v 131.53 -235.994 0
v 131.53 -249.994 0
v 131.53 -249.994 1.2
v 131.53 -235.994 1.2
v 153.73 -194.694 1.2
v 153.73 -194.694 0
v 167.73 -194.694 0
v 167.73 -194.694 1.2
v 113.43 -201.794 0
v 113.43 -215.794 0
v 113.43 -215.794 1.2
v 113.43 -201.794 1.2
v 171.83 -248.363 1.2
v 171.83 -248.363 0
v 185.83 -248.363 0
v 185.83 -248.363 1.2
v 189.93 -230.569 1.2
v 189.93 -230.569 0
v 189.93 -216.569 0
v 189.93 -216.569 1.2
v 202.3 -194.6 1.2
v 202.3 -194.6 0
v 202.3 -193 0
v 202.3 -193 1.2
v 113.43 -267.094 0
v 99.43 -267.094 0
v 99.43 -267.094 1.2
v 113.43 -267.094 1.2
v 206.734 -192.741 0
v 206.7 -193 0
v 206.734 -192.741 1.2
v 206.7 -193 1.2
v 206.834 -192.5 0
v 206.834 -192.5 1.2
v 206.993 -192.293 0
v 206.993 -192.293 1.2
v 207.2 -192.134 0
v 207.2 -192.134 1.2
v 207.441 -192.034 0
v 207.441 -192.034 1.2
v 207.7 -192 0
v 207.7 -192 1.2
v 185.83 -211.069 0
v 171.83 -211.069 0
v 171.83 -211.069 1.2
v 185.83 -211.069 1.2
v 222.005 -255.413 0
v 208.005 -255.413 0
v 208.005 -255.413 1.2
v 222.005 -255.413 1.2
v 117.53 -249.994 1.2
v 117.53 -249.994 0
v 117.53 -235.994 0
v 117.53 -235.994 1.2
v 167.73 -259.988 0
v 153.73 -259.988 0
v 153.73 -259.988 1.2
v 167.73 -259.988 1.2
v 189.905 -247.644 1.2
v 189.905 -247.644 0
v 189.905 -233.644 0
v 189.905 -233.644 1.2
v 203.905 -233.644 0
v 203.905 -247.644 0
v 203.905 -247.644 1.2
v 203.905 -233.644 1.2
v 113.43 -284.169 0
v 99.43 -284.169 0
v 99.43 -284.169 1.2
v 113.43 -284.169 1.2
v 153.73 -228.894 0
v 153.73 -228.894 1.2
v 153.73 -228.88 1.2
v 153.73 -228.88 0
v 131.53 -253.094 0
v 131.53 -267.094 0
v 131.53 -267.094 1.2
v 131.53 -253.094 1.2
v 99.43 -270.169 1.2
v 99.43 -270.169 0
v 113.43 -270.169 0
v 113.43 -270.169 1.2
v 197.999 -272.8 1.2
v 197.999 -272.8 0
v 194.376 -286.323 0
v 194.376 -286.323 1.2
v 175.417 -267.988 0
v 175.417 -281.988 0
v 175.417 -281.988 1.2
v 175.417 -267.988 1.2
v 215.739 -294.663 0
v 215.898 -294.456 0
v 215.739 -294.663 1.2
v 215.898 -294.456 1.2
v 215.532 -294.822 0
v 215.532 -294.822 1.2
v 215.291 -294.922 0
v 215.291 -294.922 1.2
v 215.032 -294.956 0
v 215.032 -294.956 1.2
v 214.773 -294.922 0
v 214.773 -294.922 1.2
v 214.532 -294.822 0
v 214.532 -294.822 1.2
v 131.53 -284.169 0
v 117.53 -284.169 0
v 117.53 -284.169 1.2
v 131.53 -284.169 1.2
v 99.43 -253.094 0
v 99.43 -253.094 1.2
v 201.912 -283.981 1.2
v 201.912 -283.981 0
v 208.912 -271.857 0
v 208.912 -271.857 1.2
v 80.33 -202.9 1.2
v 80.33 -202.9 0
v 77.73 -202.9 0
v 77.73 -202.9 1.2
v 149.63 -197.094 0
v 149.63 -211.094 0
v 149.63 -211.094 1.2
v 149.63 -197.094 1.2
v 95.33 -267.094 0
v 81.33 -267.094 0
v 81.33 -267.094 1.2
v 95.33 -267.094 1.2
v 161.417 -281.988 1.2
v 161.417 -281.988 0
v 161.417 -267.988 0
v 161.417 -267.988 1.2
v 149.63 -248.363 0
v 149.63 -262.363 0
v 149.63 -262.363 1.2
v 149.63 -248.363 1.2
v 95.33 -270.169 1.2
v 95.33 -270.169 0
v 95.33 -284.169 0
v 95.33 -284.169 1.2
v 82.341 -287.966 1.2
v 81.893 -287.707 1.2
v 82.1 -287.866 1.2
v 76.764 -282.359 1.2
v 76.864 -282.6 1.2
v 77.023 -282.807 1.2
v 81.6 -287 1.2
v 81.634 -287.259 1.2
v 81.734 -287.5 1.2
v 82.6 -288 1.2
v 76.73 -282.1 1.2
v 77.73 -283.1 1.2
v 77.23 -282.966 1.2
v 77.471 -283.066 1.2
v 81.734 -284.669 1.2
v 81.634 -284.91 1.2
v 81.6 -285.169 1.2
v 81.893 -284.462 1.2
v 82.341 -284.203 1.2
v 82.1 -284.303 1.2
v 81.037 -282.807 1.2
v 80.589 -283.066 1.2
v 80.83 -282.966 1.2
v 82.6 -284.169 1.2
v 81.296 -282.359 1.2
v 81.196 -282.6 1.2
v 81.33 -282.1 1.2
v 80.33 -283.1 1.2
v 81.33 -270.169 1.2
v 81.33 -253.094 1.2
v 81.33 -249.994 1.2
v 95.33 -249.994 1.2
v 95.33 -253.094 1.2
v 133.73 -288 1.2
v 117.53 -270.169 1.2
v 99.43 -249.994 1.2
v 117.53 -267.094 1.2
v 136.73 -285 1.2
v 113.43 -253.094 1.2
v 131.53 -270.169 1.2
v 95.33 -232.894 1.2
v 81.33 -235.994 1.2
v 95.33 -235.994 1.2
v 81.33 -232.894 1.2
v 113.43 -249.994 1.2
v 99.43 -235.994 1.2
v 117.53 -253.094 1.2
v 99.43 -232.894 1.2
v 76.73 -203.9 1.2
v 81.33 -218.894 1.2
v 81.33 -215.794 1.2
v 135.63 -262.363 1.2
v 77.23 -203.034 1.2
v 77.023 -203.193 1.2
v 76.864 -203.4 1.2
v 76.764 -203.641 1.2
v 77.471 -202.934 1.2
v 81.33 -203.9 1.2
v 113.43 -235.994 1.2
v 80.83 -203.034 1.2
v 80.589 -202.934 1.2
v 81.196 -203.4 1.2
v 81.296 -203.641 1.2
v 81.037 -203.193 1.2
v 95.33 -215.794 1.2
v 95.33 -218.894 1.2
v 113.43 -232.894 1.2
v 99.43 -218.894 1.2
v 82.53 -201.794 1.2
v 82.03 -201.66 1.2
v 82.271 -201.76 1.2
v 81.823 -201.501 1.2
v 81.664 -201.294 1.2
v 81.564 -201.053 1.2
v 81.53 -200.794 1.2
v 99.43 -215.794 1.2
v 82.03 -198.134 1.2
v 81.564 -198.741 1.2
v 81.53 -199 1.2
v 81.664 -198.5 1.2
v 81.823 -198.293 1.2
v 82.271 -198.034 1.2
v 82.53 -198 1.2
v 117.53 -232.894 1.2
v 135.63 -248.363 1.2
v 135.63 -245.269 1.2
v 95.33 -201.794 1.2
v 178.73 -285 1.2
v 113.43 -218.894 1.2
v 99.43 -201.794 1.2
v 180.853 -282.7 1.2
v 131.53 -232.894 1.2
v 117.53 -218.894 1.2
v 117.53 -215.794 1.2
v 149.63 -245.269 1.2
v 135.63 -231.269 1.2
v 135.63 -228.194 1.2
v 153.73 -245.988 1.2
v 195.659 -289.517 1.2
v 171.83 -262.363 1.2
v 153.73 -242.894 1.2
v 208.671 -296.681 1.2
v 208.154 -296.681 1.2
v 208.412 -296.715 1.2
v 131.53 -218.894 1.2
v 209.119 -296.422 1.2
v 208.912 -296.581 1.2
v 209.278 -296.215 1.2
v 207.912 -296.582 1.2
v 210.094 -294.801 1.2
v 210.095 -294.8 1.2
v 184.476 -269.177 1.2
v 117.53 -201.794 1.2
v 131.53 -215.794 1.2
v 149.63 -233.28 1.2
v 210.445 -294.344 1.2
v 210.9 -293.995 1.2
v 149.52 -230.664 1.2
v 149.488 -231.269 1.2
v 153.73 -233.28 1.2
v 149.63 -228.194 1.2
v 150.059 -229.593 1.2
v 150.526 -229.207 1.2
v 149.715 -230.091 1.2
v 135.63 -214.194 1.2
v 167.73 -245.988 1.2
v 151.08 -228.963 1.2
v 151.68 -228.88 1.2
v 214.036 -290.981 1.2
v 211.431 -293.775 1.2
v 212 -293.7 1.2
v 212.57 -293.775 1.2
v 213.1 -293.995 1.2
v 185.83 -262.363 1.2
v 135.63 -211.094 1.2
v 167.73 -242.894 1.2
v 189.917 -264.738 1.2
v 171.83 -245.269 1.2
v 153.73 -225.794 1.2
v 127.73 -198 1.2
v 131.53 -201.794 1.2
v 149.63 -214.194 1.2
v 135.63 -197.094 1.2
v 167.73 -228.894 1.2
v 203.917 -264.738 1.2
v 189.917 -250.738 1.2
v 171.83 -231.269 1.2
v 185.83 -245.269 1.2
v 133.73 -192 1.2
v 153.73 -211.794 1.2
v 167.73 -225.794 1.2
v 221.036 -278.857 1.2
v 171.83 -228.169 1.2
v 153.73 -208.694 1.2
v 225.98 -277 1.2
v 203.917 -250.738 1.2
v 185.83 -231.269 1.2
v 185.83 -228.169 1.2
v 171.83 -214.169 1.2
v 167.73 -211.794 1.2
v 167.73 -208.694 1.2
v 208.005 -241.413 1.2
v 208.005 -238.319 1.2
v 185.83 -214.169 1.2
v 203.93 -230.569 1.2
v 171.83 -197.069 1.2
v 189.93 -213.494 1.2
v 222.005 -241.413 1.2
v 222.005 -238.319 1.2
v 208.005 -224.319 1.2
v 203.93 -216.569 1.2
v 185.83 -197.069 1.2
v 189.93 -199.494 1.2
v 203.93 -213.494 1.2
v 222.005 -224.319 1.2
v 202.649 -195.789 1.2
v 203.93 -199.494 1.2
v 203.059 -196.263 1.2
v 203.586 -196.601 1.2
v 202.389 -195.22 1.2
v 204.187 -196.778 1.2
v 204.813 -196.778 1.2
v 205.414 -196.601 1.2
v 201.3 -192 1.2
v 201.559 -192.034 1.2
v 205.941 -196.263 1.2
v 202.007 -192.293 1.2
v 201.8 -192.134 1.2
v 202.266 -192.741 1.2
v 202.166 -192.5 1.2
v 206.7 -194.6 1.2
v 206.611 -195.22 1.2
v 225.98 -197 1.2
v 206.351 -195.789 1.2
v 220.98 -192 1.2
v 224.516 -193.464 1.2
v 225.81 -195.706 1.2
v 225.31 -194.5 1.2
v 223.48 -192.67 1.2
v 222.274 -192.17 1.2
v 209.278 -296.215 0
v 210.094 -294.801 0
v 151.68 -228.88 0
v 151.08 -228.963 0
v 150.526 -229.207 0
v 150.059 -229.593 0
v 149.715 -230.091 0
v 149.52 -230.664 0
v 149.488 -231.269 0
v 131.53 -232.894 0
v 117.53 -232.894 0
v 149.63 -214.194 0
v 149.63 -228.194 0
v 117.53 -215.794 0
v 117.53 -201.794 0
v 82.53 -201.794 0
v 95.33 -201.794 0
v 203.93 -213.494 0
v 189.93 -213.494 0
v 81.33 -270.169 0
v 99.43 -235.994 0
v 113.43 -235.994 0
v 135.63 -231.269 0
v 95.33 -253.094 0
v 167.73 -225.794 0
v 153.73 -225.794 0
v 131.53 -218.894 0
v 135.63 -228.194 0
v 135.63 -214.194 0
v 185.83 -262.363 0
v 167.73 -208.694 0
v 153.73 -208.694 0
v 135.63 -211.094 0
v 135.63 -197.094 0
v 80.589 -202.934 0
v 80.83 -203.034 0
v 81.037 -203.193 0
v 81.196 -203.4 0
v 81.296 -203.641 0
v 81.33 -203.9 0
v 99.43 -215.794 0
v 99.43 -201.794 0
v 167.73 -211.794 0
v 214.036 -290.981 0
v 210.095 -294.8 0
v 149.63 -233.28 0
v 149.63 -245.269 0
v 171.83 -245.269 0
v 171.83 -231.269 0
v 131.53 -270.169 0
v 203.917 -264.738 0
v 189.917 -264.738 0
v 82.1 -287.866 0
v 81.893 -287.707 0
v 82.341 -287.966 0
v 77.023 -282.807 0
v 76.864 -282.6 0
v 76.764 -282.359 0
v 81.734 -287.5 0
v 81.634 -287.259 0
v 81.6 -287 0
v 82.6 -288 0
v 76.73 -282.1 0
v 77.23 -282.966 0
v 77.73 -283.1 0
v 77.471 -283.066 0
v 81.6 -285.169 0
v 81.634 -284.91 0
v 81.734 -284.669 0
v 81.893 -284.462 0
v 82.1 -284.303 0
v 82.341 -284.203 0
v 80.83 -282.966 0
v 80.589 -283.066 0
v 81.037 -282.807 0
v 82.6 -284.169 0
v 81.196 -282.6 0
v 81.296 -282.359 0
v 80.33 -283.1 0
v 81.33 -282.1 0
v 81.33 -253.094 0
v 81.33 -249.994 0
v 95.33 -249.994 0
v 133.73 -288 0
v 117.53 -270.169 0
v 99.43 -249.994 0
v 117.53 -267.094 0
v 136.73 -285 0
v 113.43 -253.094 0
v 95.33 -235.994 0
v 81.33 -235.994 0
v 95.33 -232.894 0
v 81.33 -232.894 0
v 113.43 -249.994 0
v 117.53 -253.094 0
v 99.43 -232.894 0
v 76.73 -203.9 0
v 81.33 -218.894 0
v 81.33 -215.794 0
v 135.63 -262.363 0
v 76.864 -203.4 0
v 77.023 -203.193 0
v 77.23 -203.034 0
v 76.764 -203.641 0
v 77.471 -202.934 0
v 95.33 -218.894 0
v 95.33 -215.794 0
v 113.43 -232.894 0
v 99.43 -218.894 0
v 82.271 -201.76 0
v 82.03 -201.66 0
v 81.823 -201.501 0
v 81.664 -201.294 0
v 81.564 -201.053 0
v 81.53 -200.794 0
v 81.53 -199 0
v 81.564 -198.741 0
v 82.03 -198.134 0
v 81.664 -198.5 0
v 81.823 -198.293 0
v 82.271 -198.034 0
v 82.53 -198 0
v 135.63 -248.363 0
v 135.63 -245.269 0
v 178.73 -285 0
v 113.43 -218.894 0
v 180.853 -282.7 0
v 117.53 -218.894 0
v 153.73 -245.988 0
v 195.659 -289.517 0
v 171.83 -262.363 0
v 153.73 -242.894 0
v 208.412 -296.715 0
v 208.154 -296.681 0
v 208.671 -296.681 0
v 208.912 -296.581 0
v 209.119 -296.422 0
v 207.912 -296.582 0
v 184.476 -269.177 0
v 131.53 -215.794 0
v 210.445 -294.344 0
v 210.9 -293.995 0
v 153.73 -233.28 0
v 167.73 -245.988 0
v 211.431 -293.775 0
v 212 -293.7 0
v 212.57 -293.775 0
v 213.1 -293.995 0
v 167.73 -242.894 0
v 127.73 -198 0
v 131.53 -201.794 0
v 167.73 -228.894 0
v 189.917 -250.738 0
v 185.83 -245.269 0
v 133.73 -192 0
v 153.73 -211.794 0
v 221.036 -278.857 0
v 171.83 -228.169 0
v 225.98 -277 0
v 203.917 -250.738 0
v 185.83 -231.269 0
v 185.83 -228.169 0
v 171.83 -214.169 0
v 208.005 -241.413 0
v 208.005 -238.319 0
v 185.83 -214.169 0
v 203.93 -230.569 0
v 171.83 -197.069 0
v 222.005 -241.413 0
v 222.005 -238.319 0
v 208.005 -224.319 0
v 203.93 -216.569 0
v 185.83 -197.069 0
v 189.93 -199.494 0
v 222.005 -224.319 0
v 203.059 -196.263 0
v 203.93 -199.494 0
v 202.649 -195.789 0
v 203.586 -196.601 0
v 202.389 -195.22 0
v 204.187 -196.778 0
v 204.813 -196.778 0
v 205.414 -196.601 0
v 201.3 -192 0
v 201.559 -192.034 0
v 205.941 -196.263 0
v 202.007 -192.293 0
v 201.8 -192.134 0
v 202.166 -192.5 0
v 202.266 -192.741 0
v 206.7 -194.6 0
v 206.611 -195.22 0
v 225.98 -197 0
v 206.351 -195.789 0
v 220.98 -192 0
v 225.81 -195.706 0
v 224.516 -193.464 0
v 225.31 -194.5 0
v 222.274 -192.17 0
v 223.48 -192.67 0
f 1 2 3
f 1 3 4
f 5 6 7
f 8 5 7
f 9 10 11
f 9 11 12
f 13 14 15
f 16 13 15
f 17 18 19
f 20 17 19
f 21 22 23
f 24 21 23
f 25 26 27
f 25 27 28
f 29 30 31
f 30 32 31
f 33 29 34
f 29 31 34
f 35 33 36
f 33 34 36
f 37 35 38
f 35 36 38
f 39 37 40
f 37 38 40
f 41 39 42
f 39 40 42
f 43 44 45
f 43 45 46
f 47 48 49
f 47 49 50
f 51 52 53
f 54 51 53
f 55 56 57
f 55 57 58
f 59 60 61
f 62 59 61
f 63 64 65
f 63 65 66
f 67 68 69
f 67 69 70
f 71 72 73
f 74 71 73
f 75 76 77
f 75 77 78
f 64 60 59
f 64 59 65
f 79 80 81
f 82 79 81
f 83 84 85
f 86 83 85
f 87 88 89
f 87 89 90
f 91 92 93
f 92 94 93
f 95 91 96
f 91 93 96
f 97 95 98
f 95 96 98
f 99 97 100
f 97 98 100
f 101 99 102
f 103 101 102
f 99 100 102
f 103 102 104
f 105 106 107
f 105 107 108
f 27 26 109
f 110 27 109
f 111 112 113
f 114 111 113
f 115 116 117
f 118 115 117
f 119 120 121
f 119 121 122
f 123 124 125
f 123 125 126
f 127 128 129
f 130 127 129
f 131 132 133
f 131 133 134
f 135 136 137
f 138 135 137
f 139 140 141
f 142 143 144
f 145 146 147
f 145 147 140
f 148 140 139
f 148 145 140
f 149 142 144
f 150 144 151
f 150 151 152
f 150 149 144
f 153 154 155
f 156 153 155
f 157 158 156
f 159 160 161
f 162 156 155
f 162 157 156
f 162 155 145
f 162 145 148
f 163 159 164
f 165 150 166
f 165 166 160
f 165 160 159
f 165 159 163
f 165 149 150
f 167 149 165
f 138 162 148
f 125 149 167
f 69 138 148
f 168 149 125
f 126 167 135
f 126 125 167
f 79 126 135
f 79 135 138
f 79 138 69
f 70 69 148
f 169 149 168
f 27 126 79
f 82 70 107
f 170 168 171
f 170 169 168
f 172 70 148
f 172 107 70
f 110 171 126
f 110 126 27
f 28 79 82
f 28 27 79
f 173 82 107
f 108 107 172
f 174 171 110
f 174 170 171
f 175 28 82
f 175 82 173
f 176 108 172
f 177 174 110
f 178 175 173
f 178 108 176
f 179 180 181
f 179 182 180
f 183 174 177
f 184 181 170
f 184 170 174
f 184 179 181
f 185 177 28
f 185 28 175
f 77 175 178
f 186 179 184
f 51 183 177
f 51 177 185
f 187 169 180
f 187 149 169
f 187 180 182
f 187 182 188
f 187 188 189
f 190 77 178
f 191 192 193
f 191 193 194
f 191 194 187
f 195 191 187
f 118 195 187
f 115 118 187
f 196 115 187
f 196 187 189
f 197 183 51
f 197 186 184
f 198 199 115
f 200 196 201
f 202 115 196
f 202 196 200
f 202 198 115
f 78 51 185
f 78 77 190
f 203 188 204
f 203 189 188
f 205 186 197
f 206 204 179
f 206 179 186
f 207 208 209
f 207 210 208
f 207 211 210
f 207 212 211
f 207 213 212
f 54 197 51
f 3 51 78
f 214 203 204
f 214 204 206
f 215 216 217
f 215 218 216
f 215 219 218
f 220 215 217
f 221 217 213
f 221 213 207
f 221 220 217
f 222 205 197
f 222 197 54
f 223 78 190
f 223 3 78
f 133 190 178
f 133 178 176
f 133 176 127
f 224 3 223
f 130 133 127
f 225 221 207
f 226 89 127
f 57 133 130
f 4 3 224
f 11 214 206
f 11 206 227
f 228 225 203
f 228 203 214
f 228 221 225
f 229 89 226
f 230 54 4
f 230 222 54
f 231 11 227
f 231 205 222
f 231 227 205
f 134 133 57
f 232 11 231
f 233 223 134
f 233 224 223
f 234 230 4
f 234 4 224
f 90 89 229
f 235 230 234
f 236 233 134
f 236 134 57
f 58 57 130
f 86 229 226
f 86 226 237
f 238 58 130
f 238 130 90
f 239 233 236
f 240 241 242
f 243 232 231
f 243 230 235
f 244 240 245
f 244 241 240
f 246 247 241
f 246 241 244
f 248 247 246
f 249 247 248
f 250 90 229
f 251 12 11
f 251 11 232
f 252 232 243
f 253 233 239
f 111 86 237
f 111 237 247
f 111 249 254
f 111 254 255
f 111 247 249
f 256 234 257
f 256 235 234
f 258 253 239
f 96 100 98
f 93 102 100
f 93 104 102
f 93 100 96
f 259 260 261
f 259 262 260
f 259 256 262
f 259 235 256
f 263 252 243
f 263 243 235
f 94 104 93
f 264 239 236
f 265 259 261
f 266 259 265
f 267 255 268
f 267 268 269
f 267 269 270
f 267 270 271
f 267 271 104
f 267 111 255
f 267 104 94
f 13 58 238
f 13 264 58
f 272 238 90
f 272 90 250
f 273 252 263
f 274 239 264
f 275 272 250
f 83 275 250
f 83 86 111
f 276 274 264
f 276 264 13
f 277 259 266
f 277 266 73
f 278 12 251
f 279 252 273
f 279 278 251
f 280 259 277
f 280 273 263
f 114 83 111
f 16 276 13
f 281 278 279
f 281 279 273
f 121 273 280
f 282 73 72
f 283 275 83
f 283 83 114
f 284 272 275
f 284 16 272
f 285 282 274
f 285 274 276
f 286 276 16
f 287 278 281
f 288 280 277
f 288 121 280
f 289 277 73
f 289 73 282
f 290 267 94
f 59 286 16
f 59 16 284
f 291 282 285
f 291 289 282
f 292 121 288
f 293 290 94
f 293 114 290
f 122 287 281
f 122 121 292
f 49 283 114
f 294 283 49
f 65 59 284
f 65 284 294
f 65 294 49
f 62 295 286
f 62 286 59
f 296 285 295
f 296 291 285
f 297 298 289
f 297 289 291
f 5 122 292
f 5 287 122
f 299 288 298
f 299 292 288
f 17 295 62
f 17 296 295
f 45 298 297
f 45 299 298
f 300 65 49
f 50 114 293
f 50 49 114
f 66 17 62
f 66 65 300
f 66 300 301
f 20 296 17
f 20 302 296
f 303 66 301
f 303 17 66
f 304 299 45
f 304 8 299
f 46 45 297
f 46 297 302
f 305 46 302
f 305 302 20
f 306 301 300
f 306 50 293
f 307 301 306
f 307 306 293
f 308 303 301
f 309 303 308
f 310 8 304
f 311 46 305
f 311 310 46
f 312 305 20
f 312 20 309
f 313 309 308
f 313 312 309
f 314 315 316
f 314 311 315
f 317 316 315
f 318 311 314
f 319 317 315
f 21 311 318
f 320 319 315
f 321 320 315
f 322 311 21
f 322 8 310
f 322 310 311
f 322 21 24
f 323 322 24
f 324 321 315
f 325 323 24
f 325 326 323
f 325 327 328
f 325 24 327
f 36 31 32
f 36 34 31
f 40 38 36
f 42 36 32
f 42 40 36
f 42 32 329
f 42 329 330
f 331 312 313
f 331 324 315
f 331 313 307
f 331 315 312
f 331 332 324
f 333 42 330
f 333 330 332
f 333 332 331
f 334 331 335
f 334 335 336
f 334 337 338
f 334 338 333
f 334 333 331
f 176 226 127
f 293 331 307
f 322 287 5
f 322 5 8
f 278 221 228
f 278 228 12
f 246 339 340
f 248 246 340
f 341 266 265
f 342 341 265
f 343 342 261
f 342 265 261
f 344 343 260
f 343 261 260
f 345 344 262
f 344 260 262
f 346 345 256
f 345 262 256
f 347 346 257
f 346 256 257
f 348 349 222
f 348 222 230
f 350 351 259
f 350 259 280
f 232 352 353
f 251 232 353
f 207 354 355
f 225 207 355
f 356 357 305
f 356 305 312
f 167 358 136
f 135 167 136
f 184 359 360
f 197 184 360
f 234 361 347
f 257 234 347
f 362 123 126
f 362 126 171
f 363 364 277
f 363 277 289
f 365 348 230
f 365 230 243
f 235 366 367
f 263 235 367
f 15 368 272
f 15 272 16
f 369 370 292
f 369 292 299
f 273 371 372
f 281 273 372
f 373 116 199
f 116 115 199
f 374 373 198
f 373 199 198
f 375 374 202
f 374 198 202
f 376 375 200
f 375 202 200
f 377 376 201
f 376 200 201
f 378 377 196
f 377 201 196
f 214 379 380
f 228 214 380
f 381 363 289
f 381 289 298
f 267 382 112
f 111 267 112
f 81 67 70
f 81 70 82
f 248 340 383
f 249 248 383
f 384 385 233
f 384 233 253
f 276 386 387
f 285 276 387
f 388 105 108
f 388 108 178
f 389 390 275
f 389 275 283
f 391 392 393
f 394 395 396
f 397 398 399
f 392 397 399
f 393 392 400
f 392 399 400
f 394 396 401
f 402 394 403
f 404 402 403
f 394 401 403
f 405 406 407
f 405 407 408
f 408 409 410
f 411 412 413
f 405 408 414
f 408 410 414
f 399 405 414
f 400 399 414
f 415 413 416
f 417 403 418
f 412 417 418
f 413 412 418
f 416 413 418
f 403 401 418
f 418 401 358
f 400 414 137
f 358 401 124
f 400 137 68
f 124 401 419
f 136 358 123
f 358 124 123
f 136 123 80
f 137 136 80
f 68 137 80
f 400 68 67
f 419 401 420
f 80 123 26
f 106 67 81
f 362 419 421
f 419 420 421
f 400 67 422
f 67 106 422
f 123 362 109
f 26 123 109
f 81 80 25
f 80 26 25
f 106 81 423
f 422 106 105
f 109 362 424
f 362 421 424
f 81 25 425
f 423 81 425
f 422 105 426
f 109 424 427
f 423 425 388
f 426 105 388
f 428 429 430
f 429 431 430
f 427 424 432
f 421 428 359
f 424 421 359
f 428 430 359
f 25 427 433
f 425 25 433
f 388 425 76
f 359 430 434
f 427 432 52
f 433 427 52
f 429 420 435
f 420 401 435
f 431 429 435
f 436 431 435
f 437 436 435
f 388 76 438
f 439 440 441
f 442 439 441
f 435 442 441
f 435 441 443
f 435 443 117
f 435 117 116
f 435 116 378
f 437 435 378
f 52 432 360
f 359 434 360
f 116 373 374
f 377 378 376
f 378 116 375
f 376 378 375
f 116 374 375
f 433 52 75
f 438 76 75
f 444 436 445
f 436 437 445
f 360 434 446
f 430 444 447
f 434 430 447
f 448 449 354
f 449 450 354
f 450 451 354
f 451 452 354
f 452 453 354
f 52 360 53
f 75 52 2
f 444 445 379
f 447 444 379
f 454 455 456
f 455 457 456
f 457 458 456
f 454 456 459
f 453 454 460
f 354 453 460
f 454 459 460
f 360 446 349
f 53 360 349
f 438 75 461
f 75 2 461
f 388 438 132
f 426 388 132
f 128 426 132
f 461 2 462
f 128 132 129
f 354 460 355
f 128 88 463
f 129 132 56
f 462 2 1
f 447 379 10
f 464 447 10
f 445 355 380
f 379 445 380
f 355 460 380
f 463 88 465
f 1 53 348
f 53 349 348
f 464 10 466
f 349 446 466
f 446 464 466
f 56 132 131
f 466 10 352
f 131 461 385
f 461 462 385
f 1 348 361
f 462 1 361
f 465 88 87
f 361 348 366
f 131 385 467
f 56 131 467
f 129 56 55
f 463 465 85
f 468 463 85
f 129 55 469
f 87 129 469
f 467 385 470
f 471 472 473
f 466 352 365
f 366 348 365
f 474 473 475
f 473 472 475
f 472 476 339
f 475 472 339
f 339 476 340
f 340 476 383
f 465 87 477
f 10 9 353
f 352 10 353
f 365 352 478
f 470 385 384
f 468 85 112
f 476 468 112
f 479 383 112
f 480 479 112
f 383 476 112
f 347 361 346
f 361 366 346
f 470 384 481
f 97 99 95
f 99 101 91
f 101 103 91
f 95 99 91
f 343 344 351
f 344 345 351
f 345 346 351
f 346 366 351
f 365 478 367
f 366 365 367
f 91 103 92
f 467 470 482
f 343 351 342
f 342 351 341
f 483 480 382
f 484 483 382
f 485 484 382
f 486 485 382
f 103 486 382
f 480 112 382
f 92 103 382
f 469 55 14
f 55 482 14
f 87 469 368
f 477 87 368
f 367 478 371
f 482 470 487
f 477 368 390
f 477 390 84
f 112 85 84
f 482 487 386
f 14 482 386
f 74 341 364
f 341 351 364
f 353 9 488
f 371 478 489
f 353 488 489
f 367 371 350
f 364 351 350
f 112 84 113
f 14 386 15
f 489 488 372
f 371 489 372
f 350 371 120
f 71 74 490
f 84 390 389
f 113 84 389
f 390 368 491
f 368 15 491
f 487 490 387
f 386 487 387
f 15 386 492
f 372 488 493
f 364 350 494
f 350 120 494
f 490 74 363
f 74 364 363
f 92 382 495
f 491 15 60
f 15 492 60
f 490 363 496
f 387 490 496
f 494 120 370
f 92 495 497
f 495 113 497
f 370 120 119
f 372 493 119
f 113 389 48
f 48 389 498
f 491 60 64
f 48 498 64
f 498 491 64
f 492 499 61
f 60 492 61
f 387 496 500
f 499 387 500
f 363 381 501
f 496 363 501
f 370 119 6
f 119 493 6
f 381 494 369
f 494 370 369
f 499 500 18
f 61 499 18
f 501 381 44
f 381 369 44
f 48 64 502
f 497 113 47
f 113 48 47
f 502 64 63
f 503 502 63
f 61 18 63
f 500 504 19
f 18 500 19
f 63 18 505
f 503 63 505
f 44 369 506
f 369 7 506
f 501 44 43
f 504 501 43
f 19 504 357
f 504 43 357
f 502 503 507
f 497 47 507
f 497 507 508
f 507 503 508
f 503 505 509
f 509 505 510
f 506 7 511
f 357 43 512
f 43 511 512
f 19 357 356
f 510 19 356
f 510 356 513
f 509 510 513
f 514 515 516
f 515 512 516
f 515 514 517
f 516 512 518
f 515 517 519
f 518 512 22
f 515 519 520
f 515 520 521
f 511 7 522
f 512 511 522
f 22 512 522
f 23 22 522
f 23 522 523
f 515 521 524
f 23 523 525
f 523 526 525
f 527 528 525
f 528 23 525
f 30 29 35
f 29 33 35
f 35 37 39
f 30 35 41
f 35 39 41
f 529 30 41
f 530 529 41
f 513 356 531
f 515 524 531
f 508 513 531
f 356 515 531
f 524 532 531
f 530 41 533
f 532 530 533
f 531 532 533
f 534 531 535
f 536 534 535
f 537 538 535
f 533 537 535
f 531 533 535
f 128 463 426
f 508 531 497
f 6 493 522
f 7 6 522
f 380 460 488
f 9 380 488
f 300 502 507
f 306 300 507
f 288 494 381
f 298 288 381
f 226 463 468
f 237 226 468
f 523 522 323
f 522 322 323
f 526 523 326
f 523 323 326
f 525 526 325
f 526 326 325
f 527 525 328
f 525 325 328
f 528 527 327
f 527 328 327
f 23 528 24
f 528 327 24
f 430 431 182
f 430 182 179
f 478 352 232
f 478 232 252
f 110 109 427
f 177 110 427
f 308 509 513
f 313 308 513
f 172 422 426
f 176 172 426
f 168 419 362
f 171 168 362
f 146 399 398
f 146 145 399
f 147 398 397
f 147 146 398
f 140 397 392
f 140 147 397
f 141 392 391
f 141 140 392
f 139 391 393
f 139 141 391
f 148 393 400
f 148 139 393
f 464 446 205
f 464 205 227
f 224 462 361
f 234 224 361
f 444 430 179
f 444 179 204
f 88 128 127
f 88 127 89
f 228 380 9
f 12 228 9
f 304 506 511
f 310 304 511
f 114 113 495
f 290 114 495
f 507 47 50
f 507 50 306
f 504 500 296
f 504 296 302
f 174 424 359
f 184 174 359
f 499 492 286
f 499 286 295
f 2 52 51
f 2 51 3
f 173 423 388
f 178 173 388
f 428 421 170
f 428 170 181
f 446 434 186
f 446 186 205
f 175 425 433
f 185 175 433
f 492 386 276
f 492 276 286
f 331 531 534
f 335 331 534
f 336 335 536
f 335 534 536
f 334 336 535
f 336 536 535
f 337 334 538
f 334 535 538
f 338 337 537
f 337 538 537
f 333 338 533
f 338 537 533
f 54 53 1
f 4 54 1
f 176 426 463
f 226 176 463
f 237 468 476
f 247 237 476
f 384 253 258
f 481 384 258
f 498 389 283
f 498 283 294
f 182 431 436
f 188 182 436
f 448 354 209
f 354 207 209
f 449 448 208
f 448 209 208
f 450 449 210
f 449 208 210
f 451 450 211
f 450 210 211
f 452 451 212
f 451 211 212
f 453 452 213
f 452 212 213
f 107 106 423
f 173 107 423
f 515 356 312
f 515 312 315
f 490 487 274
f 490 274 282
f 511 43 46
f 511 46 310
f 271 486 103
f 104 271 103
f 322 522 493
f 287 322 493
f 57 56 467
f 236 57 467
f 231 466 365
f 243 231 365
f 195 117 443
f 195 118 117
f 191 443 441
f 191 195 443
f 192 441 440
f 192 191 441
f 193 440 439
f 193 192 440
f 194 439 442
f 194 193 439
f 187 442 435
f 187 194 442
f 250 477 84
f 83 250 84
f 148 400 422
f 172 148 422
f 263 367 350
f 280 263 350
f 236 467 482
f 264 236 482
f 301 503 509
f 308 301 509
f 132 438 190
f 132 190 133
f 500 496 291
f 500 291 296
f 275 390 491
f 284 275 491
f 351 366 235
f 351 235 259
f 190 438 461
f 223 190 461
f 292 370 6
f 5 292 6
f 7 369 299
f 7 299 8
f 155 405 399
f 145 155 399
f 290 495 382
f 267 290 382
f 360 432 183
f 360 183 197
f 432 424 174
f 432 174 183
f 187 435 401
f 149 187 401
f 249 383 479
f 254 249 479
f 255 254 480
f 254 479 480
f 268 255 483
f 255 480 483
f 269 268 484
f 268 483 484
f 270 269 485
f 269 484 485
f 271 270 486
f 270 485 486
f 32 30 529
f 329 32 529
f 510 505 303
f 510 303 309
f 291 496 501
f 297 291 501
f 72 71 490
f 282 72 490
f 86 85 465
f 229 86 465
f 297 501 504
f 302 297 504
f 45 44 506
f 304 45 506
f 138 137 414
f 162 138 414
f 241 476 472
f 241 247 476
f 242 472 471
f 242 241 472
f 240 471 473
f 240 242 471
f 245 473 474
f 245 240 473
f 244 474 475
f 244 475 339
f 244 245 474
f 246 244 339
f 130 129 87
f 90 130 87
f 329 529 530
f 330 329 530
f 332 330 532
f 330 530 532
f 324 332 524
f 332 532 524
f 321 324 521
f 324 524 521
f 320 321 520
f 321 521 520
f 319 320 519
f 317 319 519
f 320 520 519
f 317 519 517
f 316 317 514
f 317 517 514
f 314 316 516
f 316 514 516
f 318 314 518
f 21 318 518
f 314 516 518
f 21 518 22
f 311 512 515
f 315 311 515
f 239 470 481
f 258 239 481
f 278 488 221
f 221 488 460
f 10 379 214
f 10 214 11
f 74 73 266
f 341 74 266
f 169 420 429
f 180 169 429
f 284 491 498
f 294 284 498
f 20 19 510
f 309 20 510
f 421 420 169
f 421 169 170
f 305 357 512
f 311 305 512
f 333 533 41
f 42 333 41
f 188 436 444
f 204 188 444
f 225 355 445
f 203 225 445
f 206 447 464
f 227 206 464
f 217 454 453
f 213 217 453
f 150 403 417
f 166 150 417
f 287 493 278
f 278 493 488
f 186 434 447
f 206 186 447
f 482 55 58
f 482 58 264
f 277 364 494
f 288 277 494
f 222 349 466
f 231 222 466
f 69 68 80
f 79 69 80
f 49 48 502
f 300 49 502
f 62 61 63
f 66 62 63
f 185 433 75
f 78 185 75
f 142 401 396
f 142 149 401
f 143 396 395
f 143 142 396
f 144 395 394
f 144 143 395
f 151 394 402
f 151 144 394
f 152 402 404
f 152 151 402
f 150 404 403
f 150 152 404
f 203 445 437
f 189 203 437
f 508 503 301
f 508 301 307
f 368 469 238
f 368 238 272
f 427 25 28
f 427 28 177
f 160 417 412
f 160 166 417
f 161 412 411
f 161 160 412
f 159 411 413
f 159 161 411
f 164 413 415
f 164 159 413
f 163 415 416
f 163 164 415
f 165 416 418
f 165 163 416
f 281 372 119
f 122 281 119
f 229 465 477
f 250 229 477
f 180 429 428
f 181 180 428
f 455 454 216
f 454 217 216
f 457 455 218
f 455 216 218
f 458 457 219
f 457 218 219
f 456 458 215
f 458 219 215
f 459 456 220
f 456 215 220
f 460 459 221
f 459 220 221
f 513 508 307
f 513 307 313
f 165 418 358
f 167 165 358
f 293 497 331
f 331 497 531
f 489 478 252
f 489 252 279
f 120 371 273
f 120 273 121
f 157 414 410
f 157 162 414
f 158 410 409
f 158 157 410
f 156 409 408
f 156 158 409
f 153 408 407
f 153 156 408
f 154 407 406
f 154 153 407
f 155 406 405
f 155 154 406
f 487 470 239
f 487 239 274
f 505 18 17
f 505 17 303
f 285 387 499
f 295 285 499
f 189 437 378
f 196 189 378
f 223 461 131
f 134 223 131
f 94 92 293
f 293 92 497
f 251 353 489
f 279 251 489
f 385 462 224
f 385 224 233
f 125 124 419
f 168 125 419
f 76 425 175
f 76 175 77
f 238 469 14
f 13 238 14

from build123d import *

# Parameters (mm, degrees)
SKETCH1_W           = 14
SKETCH1_H           = 14
BOSS_EXTRUDE2_DEPTH = 1.2
FILLET1_R           = 1
CUT_EXTRUDE2_REACH  = 3.2
SKETCH2_R           = 2.2


with BuildPart() as part:
    # Sketch1 → Boss-Extrude2 (new body)
    with BuildSketch(Plane.XY):
        with BuildLine():
            Line((81.33, -202.9), (79.33, -202.9))
            Line((79.33, -202.9), (76.73, -202.9))
            Line((76.73, -202.9), (76.73, -212.03))
            Line((76.73, -212.03), (76.73, -283.1))
            Line((76.73, -283.1), (79.4, -283.1))
            Line((79.4, -283.1), (81.33, -283.1))
            Line((81.33, -283.1), (81.33, -270.169))
            Line((81.33, -270.169), (95.33, -270.169))
            Line((95.33, -270.169), (95.33, -284.169))
            Line((95.33, -284.169), (81.6, -284.169))
            Line((81.6, -284.169), (81.6, -285.300000001))
            Line((81.6, -285.300000001), (81.6, -288.000000001))
            Line((81.6, -288.000000001), (104.85, -288.000000001))
            Line((104.85, -288.000000001), (113.94, -288.000000001))
            Line((113.94, -288.000000001), (133.73, -288.000000001))
            Line((133.73, -288.000000001), (136.73, -285.000000001))
            Line((136.73, -285.000000001), (152.86, -285.000000001))
            Line((152.86, -285.000000001), (161.94, -285.000000001))
            Line((161.94, -285.000000001), (178.73, -285.000000001))
            Line((178.73, -285.000000001), (195.659492, -289.51666))
            Line((195.659492, -289.51666), (208.778384908, -297.081045818))
            Line((208.778384908, -297.081045818), (210.094127263, -294.801069106))
            Line((210.094127263, -294.801069106), (210.094924986, -294.799686776))
            ThreePointArc((210.094924986, -294.799686776), (211.43094748, -293.774869597), (213.100313224, -293.994924986))
            Line((213.100313224, -293.994924986), (215.397829273, -295.321900182))
            Line((215.397829273, -295.321900182), (225.98, -277))
            Line((225.98, -277), (225.98, -256.415))
            Line((225.98, -256.415), (225.98, -247.025))
            Line((225.98, -247.025), (225.98, -214.605))
            Line((225.98, -214.605), (225.98, -205.215))
            Line((225.98, -205.215), (225.98, -197))
            ThreePointArc((225.98, -197), (224.515534, -193.464466), (220.98, -192))
            Line((220.98, -192), (206.7, -192))
            Line((206.7, -192), (206.7, -194.6))
            ThreePointArc((206.7, -194.6), (204.5, -196.8), (202.3, -194.6))
            Line((202.3, -194.6), (202.3, -192))
            Line((202.3, -192), (179.02, -192))
            Line((179.02, -192), (169.96, -192))
            Line((169.96, -192), (136.73, -192))
            Line((136.73, -192), (133.73, -192))
            Line((133.73, -192), (127.73, -198))
            Line((127.73, -198), (108.89, -198))
            Line((108.89, -198), (99.78, -198))
            Line((99.78, -198), (82.73, -198))
            Line((82.73, -198), (81.53, -198))
            Line((81.53, -198), (81.53, -200.7))
            Line((81.53, -200.7), (81.53, -201.794))
            Line((81.53, -201.794), (95.33, -201.794))
            Line((95.33, -201.794), (95.33, -215.794))
            Line((95.33, -215.794), (81.33, -215.794))
            Line((81.33, -215.794), (81.33, -202.9))
        make_face()
        with Locations((106.43, -277.169)):
            Rectangle(SKETCH1_W, SKETCH1_H, mode=Mode.SUBTRACT)
        with Locations((124.53, -277.169)):
            Rectangle(SKETCH1_W, SKETCH1_H, mode=Mode.SUBTRACT)
        with Locations((88.33, -260.094)):
            Rectangle(SKETCH1_W, SKETCH1_H, mode=Mode.SUBTRACT)
        with Locations((106.43, -260.094)):
            Rectangle(SKETCH1_W, SKETCH1_H, mode=Mode.SUBTRACT)
        with Locations((124.53, -260.094)):
            Rectangle(SKETCH1_W, SKETCH1_H, mode=Mode.SUBTRACT)
        with Locations((142.63, -255.362582)):
            Rectangle(SKETCH1_W, SKETCH1_H, mode=Mode.SUBTRACT)
        with Locations((168.416577, -274.987582)):
            Rectangle(SKETCH1_W, SKETCH1_H, mode=Mode.SUBTRACT)
        Polygon((194.375574468, -286.3230671), (180.8526129, -282.699600468), (184.476079532, -269.1766389), (197.9990411, -272.800105532), align=None, mode=Mode.SUBTRACT)
        Polygon((221.036025826, -278.856733174), (214.036025826, -290.981088826), (201.911670174, -283.981088826), (208.911670174, -271.856733174), align=None, mode=Mode.SUBTRACT)
        with Locations((160.73, -252.987582)):
            Rectangle(SKETCH1_W, SKETCH1_H, mode=Mode.SUBTRACT)
        with Locations((178.83, -255.362582)):
            Rectangle(SKETCH1_W, SKETCH1_H, mode=Mode.SUBTRACT)
        with Locations((196.916577, -257.737582)):
            Rectangle(SKETCH1_W, SKETCH1_H, mode=Mode.SUBTRACT)
        with Locations((215.005, -248.412582)):
            Rectangle(SKETCH1_W, SKETCH1_H, mode=Mode.SUBTRACT)
        with Locations((88.33, -242.994)):
            Rectangle(SKETCH1_W, SKETCH1_H, mode=Mode.SUBTRACT)
        with Locations((106.43, -242.994)):
            Rectangle(SKETCH1_W, SKETCH1_H, mode=Mode.SUBTRACT)
        with Locations((88.33, -225.894)):
            Rectangle(SKETCH1_W, SKETCH1_H, mode=Mode.SUBTRACT)
        with Locations((106.43, -225.894)):
            Rectangle(SKETCH1_W, SKETCH1_H, mode=Mode.SUBTRACT)
        with Locations((124.53, -242.994)):
            Rectangle(SKETCH1_W, SKETCH1_H, mode=Mode.SUBTRACT)
        with Locations((142.63, -238.269)):
            Rectangle(SKETCH1_W, SKETCH1_H, mode=Mode.SUBTRACT)
        with Locations((124.53, -225.894)):
            Rectangle(SKETCH1_W, SKETCH1_H, mode=Mode.SUBTRACT)
        with Locations((142.63, -221.194)):
            Rectangle(SKETCH1_W, SKETCH1_H, mode=Mode.SUBTRACT)
        with Locations((106.43, -208.794)):
            Rectangle(SKETCH1_W, SKETCH1_H, mode=Mode.SUBTRACT)
        with Locations((124.53, -208.794)):
            Rectangle(SKETCH1_W, SKETCH1_H, mode=Mode.SUBTRACT)
        with Locations((142.63, -204.094)):
            Rectangle(SKETCH1_W, SKETCH1_H, mode=Mode.SUBTRACT)
        with Locations((160.73, -235.894)):
            Rectangle(SKETCH1_W, SKETCH1_H, mode=Mode.SUBTRACT)
        with Locations((178.83, -238.269)):
            Rectangle(SKETCH1_W, SKETCH1_H, mode=Mode.SUBTRACT)
        with Locations((160.73, -218.794)):
            Rectangle(SKETCH1_W, SKETCH1_H, mode=Mode.SUBTRACT)
        with Locations((178.83, -221.169)):
            Rectangle(SKETCH1_W, SKETCH1_H, mode=Mode.SUBTRACT)
        with Locations((196.905, -240.644)):
            Rectangle(SKETCH1_W, SKETCH1_H, mode=Mode.SUBTRACT)
        with Locations((196.93, -223.569)):
            Rectangle(SKETCH1_W, SKETCH1_H, mode=Mode.SUBTRACT)
        with Locations((215.005, -231.319)):
            Rectangle(SKETCH1_W, SKETCH1_H, mode=Mode.SUBTRACT)
        with Locations((160.73, -201.694)):
            Rectangle(SKETCH1_W, SKETCH1_H, mode=Mode.SUBTRACT)
        with Locations((178.83, -204.069)):
            Rectangle(SKETCH1_W, SKETCH1_H, mode=Mode.SUBTRACT)
        with Locations((196.93, -206.494)):
            Rectangle(SKETCH1_W, SKETCH1_H, mode=Mode.SUBTRACT)
    extrude(amount=BOSS_EXTRUDE2_DEPTH)

    # Fillet1
    fillet1_edges = [part.edges().sort_by_distance(p)[0] for p in [
        (208.778384908, -297.081045818, 0.6),
        (81.6, -288.000000001, 0.6),
        (81.6, -284.169, 0.6),
        (81.33, -283.1, 0.6),
        (76.73, -283.1, 0.6),
        (76.73, -202.9, 0.6),
        (81.33, -202.9, 0.6),
        (81.53, -201.794, 0.6),
        (81.53, -198, 0.6),
        (202.3, -192, 0.6),
        (206.7, -192, 0.6),
        (215.397829273, -295.321900182, 0.6),
    ]]
    fillet(fillet1_edges, radius=FILLET1_R)

    # Sketch2 → Cut-Extrude2 (cut, up to next)
    with BuildSketch(Plane.XY.offset(1.2), mode=Mode.PRIVATE) as cut_extrude2_sk1:
        with BuildLine():
            Line((153.73, -228.88), (151.68, -228.88))
            ThreePointArc((151.68, -228.88), (152.921660353, -229.263883383), (153.73, -230.281564029))
            Line((153.73, -230.281564029), (153.73, -228.894))
            Line((153.73, -228.894), (153.73, -228.88))
        make_face()
    cut_extrude2_tool1 = extrude(cut_extrude2_sk1.sketch, amount=-CUT_EXTRUDE2_REACH, mode=Mode.PRIVATE) & part.part
    add(cut_extrude2_tool1.solids().sort_by_distance((153.255364, -229.260338, 1.2))[0], mode=Mode.SUBTRACT)
    # Sketch2 → Cut-Extrude2 (cut, up to next)
    with BuildSketch(Plane.XY.offset(1.2), mode=Mode.PRIVATE) as cut_extrude2_sk2:
        with Locations((151.68, -231.08)):
            Circle(SKETCH2_R)
    cut_extrude2_tool2 = extrude(cut_extrude2_sk2.sketch, amount=-CUT_EXTRUDE2_REACH, mode=Mode.PRIVATE) & part.part
    add(cut_extrude2_tool2.solids().sort_by_distance((151.68, -231.08, 1.2))[0], mode=Mode.SUBTRACT)
    # Sketch2 → Cut-Extrude2 (cut, up to next)
    with BuildSketch(Plane.XY.offset(1.2), mode=Mode.PRIVATE) as cut_extrude2_sk3:
        with BuildLine():
            ThreePointArc((153.73, -231.878435971), (152.921660353, -232.896116617), (151.68, -233.28))
            Line((151.68, -233.28), (153.73, -233.28))
            Line((153.73, -233.28), (153.73, -231.878435971))
        make_face()
    cut_extrude2_tool3 = extrude(cut_extrude2_sk3.sketch, amount=-CUT_EXTRUDE2_REACH, mode=Mode.PRIVATE) & part.part
    add(cut_extrude2_tool3.solids().sort_by_distance((153.255364, -232.899662, 1.2))[0], mode=Mode.SUBTRACT)
    # Sketch2 → Cut-Extrude2 (cut, up to next)
    with BuildSketch(Plane.XY.offset(1.2), mode=Mode.PRIVATE) as cut_extrude2_sk4:
        with BuildLine():
            ThreePointArc((151.68, -233.28), (150.438339647, -232.896116617), (149.63, -231.878435971))
            Line((149.63, -231.878435971), (149.63, -233.28))
            Line((149.63, -233.28), (151.68, -233.28))
        make_face()
    cut_extrude2_tool4 = extrude(cut_extrude2_sk4.sketch, amount=-CUT_EXTRUDE2_REACH, mode=Mode.PRIVATE) & part.part
    add(cut_extrude2_tool4.solids().sort_by_distance((150.104636, -232.899662, 1.2))[0], mode=Mode.SUBTRACT)


solid = part.part
